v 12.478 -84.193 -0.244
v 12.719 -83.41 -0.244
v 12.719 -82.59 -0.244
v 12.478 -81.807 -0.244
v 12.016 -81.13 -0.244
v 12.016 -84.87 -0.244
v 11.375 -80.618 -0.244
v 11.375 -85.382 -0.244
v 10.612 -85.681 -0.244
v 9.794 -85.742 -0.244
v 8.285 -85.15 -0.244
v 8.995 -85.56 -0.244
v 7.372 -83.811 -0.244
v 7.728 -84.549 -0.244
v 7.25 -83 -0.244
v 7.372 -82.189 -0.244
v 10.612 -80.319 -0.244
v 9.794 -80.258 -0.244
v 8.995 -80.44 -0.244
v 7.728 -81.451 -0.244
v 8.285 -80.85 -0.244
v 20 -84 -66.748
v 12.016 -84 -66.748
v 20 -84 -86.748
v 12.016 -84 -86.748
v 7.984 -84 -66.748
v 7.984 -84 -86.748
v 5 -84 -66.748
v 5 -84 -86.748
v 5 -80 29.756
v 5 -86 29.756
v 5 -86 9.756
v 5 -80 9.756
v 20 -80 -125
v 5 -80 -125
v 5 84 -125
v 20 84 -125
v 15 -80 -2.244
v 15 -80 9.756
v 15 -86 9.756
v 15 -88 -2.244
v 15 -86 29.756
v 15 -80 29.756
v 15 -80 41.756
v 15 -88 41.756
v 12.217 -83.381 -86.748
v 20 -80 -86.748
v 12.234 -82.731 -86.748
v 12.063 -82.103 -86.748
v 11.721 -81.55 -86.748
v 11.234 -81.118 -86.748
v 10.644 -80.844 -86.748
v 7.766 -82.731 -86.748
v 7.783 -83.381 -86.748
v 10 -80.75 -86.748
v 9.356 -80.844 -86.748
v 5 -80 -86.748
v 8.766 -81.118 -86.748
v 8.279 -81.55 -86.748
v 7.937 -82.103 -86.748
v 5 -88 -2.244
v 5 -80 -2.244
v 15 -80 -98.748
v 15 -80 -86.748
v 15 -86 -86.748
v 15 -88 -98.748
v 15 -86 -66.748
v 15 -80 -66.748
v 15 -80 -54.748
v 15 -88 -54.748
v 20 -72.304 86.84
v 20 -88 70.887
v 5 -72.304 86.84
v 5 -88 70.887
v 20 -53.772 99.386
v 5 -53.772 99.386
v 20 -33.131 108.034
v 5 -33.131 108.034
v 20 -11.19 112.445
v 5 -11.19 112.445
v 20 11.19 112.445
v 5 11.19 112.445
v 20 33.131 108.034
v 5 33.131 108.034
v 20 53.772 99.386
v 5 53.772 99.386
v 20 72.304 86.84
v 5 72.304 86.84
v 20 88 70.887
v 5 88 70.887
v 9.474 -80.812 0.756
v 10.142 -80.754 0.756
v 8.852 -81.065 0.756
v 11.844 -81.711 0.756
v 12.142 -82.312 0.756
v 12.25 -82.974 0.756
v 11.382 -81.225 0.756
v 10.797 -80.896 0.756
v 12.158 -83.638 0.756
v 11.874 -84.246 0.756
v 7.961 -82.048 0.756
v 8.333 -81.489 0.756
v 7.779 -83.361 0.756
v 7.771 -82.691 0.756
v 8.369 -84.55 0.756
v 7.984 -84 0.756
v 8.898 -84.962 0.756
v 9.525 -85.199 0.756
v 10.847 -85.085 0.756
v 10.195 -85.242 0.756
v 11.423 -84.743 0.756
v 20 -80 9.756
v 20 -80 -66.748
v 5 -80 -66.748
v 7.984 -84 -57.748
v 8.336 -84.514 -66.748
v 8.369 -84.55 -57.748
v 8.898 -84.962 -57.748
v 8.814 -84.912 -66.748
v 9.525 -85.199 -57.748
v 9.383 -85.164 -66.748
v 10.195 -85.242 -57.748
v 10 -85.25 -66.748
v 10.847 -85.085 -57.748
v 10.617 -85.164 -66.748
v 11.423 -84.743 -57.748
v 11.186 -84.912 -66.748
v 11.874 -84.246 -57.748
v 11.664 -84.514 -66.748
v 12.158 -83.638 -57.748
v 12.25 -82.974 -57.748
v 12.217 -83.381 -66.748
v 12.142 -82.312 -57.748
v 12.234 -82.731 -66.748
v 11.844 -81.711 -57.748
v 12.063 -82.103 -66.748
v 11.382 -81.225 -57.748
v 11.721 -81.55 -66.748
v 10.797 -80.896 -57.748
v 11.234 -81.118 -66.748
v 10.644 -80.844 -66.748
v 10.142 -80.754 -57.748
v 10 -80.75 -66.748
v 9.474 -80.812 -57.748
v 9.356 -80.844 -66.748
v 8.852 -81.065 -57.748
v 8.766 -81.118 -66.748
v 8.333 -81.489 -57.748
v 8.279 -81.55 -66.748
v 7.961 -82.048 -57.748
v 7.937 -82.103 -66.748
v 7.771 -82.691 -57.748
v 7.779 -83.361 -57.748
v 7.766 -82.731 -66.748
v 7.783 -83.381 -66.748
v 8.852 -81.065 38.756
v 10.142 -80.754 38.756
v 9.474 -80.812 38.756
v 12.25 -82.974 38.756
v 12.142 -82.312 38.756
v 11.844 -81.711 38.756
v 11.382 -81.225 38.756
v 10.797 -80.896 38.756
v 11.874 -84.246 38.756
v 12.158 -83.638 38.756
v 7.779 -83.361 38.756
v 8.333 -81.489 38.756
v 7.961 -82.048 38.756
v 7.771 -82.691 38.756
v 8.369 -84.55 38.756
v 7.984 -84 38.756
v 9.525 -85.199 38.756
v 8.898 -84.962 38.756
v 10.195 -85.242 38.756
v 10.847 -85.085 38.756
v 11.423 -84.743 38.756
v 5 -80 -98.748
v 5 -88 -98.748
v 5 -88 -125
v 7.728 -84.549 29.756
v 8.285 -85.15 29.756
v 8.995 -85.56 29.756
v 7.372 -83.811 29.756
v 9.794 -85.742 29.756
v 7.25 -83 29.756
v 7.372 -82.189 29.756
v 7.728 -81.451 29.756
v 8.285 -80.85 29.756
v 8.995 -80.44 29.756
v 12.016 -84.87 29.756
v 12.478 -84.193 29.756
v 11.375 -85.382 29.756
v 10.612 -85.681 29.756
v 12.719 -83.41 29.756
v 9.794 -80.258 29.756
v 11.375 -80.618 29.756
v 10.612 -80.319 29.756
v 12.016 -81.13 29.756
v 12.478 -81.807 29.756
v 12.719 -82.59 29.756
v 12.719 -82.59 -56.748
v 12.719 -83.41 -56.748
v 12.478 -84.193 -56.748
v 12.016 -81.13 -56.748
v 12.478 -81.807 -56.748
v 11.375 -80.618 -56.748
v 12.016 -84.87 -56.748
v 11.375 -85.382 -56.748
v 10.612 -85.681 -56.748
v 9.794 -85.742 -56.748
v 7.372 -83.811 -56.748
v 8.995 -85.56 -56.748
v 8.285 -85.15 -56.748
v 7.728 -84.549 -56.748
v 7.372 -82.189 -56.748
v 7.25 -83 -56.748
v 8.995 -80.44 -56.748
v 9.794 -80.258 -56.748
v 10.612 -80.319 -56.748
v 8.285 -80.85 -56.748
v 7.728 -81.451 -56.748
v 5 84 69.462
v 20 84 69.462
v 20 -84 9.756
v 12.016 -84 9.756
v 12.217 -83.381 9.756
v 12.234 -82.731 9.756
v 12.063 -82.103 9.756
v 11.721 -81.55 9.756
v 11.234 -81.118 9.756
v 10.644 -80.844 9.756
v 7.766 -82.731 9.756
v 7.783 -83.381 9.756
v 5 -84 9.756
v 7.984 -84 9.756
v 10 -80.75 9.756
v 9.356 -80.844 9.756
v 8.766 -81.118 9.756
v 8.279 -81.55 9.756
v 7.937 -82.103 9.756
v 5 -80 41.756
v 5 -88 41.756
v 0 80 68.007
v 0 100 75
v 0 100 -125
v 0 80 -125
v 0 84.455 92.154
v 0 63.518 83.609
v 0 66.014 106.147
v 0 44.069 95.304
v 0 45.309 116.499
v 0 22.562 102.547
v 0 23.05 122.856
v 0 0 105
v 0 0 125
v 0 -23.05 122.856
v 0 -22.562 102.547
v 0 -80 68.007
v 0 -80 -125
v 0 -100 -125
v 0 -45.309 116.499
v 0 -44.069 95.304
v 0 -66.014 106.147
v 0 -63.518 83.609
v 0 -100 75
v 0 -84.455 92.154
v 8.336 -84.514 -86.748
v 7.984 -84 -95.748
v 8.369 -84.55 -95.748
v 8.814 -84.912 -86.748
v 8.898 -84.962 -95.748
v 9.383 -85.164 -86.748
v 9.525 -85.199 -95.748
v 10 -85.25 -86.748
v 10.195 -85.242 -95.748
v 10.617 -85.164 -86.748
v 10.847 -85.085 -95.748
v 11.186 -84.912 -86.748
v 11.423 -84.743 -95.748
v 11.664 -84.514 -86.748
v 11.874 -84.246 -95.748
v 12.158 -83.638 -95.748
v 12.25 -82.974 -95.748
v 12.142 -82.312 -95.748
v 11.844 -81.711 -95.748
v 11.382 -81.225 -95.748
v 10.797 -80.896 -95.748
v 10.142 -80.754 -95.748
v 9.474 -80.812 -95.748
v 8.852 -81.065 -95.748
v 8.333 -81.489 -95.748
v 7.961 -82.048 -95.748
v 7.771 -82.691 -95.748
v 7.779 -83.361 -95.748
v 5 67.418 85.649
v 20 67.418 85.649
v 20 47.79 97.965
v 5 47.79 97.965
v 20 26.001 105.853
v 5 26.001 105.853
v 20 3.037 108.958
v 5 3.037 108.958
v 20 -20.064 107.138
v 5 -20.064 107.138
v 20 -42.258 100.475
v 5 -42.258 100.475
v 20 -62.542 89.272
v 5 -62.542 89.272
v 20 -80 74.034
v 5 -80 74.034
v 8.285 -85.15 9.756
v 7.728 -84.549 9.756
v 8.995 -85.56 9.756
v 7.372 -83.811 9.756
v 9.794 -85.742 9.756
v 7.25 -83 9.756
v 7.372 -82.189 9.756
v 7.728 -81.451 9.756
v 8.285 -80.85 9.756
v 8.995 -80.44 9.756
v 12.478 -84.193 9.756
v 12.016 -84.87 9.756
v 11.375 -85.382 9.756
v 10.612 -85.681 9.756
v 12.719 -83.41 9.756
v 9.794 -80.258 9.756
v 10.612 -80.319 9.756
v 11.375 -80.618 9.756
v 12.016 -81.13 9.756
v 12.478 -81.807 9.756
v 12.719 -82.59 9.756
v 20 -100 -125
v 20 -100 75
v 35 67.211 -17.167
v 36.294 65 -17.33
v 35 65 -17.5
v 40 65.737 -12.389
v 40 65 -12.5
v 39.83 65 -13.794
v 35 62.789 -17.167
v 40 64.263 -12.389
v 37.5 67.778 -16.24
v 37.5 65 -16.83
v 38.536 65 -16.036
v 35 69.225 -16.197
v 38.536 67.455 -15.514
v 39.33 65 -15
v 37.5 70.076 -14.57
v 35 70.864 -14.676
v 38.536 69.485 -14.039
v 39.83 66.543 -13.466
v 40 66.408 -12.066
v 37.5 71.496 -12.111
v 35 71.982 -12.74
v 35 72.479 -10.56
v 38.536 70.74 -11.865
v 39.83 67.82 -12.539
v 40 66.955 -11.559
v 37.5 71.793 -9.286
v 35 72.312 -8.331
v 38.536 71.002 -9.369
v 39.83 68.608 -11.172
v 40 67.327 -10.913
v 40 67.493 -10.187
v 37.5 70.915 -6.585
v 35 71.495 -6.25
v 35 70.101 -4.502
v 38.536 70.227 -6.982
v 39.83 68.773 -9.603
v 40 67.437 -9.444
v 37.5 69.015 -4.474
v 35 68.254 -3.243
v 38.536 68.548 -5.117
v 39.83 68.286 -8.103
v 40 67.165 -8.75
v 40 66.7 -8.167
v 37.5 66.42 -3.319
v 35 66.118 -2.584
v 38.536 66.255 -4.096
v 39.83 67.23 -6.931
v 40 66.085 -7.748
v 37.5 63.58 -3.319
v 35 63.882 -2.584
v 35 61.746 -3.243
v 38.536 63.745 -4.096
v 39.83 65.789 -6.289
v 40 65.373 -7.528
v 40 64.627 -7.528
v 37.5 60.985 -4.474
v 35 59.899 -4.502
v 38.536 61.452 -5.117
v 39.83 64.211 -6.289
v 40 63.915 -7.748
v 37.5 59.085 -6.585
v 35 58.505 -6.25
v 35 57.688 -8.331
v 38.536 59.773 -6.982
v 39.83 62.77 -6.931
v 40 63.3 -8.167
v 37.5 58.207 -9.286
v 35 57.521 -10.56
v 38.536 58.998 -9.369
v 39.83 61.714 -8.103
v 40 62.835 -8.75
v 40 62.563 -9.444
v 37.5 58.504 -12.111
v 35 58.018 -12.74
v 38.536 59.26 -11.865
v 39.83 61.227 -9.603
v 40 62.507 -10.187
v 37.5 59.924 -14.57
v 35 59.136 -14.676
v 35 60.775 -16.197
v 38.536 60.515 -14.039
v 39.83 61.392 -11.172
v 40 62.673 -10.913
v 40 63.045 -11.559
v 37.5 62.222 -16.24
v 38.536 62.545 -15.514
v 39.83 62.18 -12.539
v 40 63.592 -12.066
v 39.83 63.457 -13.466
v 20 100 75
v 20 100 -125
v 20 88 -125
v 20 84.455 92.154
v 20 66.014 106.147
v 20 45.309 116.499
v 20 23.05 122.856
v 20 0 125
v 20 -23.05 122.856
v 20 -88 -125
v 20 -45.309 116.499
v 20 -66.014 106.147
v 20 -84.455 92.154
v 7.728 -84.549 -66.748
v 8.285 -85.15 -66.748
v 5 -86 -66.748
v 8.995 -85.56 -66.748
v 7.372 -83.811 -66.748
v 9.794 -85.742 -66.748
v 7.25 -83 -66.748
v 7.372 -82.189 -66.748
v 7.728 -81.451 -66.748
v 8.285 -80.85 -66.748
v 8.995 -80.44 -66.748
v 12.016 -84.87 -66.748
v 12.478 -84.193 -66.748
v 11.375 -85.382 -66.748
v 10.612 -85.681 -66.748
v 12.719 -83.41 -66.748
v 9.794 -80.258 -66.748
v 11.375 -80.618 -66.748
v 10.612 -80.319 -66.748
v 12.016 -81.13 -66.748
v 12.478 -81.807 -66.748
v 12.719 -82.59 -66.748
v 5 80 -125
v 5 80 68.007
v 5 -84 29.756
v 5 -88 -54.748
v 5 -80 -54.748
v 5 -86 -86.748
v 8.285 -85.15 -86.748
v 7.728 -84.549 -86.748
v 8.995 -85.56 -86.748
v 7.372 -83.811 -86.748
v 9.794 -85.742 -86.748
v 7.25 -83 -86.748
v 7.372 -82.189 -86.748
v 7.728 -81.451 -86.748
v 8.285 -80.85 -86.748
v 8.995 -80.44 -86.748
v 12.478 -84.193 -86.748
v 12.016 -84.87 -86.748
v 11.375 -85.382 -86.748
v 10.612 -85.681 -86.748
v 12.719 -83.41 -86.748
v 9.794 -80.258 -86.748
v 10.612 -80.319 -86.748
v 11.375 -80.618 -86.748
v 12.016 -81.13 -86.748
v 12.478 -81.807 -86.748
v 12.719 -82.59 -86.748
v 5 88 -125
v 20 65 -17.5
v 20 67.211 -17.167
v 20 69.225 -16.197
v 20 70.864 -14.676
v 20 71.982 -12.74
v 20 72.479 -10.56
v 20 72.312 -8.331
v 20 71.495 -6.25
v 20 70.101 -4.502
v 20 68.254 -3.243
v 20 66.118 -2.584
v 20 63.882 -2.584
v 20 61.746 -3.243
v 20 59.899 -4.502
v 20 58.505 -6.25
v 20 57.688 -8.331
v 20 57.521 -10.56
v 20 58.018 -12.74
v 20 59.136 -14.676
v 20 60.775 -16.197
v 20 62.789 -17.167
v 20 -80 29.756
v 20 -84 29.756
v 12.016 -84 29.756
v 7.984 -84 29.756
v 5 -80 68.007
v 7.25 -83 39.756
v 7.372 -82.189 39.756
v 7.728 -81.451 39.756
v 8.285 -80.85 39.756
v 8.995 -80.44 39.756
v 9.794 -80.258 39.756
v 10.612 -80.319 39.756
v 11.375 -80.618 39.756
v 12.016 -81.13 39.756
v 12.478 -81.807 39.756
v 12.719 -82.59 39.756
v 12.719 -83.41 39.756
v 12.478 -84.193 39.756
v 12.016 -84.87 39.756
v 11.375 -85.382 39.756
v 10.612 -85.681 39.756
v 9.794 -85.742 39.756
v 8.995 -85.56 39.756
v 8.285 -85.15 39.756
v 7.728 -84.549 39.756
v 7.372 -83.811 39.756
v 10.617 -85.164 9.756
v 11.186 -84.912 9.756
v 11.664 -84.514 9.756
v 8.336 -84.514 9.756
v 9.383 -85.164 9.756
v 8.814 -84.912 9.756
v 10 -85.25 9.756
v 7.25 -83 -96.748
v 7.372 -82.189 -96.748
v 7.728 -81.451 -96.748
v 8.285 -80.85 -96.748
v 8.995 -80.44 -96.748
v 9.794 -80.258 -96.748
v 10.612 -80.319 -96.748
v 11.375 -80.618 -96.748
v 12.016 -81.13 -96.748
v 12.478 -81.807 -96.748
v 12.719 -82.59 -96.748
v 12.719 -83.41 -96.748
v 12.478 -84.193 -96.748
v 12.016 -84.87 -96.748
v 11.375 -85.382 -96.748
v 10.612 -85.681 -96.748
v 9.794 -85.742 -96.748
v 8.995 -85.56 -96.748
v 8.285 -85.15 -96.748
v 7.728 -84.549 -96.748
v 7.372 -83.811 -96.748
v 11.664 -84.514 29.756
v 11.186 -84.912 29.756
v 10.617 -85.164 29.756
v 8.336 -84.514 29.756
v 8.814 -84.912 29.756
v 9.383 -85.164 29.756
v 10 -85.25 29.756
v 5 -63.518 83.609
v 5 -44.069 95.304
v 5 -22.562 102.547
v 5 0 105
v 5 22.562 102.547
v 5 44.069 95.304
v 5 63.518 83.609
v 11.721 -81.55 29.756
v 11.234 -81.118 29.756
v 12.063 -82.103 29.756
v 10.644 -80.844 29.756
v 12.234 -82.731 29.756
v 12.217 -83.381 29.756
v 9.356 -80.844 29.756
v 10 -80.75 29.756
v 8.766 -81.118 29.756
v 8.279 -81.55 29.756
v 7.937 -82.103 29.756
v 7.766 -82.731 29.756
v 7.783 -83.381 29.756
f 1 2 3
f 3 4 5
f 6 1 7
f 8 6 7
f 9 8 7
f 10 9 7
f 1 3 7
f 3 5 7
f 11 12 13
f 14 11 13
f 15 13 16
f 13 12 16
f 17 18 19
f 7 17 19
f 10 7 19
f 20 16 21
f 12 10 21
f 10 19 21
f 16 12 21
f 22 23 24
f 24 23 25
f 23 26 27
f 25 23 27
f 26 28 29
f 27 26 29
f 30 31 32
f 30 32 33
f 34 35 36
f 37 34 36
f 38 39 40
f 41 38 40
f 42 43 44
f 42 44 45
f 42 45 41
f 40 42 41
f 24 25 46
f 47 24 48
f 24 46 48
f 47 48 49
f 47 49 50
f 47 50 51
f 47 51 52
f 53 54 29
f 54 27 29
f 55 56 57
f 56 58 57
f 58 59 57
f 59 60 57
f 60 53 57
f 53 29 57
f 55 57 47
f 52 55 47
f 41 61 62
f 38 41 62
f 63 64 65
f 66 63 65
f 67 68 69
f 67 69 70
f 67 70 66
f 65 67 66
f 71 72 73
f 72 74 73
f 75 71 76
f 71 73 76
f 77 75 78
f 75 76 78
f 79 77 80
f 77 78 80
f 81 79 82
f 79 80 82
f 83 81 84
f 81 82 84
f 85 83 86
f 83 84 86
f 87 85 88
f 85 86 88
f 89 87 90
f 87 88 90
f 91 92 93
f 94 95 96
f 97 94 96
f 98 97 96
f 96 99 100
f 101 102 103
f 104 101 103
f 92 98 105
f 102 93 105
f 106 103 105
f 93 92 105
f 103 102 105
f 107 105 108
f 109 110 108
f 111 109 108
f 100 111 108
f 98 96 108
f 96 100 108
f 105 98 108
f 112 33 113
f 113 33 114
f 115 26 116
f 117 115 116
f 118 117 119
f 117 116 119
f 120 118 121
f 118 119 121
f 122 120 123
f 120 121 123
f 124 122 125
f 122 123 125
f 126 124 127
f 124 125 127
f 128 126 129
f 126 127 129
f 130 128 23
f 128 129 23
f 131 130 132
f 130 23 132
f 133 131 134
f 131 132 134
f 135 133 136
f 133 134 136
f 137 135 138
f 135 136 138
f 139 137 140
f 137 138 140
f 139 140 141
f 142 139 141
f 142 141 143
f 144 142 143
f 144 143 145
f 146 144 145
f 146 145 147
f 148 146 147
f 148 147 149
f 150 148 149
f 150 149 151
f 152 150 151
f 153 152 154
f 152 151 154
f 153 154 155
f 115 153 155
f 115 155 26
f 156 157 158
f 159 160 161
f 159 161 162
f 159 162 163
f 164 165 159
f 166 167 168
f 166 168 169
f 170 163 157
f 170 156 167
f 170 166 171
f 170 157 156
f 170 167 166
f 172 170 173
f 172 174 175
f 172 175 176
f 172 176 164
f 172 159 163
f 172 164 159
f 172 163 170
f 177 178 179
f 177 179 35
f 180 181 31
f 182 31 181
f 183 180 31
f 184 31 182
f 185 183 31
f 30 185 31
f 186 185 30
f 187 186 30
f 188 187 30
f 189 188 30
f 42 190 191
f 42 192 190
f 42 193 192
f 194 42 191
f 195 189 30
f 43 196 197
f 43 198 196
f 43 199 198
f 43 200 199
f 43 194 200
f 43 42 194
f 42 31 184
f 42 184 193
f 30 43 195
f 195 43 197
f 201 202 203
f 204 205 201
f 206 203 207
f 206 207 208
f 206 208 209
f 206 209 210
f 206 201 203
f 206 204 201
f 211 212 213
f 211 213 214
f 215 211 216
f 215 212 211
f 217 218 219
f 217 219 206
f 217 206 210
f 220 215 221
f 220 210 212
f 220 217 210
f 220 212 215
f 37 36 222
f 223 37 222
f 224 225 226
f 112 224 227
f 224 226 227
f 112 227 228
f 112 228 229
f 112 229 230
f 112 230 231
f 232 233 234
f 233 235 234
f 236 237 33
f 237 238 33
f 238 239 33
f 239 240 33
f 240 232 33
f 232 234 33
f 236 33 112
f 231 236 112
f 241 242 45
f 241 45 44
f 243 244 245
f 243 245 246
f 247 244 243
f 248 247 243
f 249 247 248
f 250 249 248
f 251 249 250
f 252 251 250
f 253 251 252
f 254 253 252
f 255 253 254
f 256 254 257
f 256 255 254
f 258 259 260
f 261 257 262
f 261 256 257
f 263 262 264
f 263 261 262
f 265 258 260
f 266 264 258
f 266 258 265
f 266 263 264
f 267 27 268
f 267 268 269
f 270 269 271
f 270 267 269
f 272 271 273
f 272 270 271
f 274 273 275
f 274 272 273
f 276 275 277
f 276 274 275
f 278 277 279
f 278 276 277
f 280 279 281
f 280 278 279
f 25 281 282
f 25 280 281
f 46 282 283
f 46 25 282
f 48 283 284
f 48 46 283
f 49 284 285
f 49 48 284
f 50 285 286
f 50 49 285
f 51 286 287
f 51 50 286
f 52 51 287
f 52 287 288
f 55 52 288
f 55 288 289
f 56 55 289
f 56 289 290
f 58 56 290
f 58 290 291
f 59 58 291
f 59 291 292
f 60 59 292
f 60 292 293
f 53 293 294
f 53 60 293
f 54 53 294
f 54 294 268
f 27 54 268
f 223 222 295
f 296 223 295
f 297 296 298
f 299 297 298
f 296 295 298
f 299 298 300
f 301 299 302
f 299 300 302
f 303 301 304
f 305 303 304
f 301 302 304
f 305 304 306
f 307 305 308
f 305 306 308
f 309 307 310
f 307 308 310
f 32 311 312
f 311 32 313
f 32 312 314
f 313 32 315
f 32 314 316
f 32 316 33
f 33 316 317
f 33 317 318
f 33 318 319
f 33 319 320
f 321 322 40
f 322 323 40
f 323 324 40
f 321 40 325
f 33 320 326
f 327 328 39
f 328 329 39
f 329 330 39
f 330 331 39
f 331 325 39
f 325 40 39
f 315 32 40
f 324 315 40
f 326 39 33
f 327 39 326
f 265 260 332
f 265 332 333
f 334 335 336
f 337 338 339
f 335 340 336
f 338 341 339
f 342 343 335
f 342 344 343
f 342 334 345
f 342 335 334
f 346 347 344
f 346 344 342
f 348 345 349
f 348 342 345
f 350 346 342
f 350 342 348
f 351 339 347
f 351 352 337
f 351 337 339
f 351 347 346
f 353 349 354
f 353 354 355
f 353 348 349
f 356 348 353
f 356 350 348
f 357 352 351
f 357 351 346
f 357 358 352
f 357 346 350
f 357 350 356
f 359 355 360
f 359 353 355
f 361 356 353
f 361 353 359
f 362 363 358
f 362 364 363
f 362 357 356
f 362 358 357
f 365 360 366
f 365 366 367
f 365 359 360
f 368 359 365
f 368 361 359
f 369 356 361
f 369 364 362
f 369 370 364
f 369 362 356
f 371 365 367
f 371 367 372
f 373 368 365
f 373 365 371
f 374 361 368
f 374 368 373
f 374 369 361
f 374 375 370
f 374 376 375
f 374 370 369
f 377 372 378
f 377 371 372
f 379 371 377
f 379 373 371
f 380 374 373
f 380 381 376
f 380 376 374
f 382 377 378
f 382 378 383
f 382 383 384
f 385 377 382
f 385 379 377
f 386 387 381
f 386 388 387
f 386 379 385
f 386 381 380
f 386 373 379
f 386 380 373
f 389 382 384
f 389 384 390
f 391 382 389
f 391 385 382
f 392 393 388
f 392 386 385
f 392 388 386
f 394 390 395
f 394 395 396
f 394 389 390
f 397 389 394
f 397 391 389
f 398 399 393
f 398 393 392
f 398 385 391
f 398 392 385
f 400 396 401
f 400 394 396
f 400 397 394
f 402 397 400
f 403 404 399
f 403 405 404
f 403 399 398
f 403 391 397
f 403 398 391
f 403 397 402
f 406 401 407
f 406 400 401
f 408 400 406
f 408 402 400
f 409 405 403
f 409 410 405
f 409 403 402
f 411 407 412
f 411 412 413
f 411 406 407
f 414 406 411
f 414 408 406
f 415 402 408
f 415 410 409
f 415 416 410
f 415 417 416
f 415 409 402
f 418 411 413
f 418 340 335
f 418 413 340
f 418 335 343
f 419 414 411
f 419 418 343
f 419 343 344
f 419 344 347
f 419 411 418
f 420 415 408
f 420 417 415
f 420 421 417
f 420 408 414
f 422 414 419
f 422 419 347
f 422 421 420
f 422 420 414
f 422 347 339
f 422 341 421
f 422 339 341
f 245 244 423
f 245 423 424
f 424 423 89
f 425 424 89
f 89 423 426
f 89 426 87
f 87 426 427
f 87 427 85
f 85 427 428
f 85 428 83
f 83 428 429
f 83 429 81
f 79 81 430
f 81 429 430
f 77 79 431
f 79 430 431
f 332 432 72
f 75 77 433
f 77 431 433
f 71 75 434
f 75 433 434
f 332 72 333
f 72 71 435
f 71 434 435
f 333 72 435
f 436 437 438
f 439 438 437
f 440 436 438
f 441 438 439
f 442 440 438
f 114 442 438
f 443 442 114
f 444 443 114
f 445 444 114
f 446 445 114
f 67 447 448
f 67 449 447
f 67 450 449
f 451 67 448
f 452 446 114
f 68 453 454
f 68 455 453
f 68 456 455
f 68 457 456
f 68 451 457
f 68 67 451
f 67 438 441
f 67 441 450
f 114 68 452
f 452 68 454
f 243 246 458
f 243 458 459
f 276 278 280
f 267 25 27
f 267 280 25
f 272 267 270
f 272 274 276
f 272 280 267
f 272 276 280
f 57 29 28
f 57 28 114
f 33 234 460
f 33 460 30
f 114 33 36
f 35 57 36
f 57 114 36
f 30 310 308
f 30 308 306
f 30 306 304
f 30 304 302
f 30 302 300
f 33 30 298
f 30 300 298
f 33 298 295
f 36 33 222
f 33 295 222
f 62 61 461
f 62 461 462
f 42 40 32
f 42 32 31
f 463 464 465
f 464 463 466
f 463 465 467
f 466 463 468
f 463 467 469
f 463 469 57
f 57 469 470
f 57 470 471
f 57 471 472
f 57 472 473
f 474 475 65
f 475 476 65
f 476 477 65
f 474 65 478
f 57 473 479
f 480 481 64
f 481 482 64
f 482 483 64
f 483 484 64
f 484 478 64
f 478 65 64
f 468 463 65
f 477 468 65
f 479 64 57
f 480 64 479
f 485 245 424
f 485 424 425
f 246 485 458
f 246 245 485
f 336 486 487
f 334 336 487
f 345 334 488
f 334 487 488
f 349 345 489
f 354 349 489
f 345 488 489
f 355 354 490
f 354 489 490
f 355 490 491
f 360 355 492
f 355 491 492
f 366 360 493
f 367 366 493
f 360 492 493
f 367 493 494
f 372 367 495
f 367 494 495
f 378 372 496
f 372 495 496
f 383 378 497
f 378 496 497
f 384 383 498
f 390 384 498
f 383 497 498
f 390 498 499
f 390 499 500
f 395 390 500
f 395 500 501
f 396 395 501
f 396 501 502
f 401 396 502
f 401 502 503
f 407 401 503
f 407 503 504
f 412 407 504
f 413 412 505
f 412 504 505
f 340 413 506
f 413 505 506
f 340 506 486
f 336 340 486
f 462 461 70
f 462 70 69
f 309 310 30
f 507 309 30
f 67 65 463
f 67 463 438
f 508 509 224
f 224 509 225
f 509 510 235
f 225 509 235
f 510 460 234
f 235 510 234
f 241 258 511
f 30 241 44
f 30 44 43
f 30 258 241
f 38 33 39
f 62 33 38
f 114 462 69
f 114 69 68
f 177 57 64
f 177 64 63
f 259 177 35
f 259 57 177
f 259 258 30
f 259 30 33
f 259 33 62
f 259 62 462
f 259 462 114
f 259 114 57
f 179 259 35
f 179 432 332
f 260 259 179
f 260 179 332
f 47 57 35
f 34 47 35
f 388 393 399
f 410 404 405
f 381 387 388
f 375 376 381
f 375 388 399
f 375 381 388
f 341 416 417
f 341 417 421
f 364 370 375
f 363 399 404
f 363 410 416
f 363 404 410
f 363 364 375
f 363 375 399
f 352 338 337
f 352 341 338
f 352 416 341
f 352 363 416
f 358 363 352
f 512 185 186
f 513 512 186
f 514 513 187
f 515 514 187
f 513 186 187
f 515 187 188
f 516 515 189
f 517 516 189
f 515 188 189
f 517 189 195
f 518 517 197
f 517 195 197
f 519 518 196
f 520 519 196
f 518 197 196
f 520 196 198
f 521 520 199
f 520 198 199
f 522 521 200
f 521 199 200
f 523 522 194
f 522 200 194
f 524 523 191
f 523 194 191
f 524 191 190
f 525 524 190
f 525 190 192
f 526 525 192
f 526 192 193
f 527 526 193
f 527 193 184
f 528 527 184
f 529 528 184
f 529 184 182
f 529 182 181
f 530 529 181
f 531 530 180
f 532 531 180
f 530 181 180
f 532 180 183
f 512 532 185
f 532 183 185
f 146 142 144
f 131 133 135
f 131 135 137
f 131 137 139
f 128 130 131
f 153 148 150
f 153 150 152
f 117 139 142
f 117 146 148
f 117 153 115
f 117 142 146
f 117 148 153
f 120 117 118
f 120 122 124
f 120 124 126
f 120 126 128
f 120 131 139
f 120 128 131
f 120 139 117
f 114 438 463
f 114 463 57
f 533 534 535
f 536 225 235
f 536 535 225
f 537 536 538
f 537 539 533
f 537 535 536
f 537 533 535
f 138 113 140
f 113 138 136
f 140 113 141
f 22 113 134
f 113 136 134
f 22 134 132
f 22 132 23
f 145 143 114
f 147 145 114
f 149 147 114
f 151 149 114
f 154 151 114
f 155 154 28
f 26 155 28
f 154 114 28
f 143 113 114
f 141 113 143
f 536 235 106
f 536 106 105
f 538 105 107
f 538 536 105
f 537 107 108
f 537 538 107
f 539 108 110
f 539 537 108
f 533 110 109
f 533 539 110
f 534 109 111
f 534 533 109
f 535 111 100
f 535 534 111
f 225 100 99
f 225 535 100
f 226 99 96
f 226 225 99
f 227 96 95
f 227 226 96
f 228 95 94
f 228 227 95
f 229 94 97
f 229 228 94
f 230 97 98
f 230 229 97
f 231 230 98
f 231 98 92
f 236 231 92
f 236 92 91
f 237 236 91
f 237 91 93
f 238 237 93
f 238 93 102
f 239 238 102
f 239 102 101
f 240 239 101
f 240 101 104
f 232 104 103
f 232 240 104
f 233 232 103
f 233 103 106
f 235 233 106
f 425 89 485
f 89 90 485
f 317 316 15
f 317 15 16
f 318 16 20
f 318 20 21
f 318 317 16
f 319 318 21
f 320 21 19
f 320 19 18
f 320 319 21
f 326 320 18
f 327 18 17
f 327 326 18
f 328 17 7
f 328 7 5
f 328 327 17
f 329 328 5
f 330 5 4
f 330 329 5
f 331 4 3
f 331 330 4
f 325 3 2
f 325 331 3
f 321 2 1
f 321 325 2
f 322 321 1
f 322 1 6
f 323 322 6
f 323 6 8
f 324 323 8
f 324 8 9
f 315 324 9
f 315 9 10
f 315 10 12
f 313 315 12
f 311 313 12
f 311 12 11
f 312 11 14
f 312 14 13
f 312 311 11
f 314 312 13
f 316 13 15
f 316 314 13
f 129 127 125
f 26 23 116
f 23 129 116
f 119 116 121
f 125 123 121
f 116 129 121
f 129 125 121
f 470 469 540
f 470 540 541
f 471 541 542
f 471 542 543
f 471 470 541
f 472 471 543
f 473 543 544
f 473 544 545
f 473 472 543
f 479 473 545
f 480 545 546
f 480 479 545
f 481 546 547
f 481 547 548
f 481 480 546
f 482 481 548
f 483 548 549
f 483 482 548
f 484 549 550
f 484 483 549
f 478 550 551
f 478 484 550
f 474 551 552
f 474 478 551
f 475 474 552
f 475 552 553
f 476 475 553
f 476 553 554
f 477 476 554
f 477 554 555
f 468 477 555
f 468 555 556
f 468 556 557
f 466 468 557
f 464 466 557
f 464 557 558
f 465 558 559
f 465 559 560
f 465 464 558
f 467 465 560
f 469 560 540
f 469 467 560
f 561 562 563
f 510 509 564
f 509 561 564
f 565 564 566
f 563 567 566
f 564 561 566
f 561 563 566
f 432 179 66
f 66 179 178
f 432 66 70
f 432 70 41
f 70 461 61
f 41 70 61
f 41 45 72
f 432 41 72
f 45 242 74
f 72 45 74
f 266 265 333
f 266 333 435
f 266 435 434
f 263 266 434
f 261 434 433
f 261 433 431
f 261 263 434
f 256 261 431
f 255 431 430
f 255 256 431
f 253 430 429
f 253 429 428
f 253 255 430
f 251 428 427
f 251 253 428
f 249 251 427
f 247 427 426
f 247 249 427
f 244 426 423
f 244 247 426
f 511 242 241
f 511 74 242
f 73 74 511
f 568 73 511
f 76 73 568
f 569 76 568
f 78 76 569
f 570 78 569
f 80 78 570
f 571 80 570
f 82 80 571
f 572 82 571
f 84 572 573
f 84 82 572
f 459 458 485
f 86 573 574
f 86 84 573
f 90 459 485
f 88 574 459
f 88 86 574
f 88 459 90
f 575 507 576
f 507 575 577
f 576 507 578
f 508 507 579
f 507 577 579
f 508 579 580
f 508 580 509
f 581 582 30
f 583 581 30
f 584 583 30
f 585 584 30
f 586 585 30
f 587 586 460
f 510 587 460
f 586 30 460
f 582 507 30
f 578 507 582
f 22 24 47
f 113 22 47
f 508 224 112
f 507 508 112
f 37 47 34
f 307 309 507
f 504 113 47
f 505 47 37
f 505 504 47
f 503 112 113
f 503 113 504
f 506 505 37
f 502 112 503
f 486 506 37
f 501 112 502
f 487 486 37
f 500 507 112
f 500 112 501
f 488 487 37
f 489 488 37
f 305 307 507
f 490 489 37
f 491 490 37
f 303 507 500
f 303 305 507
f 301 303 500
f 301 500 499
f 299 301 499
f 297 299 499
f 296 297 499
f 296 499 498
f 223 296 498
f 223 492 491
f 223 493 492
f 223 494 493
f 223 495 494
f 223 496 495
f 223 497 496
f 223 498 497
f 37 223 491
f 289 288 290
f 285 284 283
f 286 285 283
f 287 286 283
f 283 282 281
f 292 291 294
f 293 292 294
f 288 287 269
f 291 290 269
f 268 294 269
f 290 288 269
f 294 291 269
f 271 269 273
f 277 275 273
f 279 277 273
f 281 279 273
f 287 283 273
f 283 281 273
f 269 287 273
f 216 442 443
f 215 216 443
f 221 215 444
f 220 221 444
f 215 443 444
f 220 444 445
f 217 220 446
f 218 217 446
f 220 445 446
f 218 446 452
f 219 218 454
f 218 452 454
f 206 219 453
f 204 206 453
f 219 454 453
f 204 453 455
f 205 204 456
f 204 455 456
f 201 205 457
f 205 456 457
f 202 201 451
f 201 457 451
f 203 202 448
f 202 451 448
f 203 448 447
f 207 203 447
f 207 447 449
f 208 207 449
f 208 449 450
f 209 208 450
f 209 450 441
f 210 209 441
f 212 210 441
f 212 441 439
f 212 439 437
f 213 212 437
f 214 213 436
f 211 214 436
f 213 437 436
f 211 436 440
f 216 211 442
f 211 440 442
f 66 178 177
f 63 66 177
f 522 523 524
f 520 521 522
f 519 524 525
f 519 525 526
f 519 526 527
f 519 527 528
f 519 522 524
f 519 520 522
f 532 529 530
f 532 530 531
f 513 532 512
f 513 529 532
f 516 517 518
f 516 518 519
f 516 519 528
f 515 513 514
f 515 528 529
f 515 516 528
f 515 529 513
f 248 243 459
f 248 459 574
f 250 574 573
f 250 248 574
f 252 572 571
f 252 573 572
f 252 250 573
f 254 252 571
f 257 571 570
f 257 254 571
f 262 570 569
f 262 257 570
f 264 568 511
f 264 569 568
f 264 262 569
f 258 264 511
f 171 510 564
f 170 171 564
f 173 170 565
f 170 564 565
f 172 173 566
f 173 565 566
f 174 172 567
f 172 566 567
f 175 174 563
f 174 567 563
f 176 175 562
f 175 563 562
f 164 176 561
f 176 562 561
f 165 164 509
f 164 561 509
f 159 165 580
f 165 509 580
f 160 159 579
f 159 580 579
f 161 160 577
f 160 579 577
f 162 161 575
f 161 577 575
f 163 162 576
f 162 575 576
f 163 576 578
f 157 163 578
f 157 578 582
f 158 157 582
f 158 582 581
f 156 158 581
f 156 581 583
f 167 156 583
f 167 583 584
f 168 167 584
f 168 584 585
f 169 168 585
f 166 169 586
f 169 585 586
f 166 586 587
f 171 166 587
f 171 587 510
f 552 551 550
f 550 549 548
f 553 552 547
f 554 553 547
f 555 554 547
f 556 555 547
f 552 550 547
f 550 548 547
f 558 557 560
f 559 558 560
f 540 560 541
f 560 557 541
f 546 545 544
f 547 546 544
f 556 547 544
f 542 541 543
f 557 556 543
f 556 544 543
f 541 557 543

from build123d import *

# Parameters (mm, degrees)
SALIENTE_EXTRUIR1_DEPTH      = 20
CORTAR_EXTRUIR1_START        = -5
CORTAR_EXTRUIR1_DEPTH        = 5
CROQUIS3_W                   = 6
CROQUIS3_H                   = 20
CORTAR_EXTRUIR2_DEPTH        = 10
CROQUIS4_R                   = 2.75
CORTAR_EXTRUIR3_DEPTH        = 10
SIMETR_A2_COPY_1_SKETCH_R    = 2.75
SIMETR_A2_COPY_1_DEPTH       = 10
SALIENTE_EXTRUIR2_DEPTH      = 5
SALIENTE_EXTRUIR2_DEPTH_BACK = 10
CROQUIS6_R                   = 2.25
SALIENTE_EXTRUIR3_DEPTH      = 9
SIMETR_A4_COPY_1_SKETCH_R    = 2.25
SIMETR_A4_COPY_1_DEPTH       = 9
CORTAR_EXTRUIR4_START        = -10
CROQUIS7_W                   = 8
CROQUIS7_H                   = 26.251838136
CROQUIS7_H_2                 = 52.503676272
CORTAR_EXTRUIR4_DEPTH        = 10
CROQUIS8_R                   = 7.5
SALIENTE_EXTRUIR5_DEPTH      = 20
REDONDEO1_R                  = 5


with BuildPart() as part:
    # Croquis1 → Saliente-Extruir1 (new body)
    with BuildSketch(Plane.YZ):
        with BuildLine():
            Line((-100, -125), (-100, 75))
            ThreePointArc((-100, 75), (0, 125), (100, 75))
            Line((100, 75), (100, -125))
            Line((100, -125), (80, -125))
            Line((80, -125), (80, -105))
            Line((80, -105), (80, 68.007352544))
            ThreePointArc((80, 68.007352544), (0, 105), (-80, 68.007352544))
            Line((-80, 68.007352544), (-80, -105))
            Line((-80, -105), (-80, -125))
            Line((-80, -125), (-100, -125))
        make_face()
    extrude(amount=SALIENTE_EXTRUIR1_DEPTH)

    # Croquis2 → Cortar-Extruir1 (cut)
    with BuildSketch(Plane.YZ.offset(20).offset(CORTAR_EXTRUIR1_START)):
        with BuildLine():
            Line((88, 70.887234394), (88, -125))
            Line((88, -125), (80, -125))
            Line((80, -125), (80, 68.007352544))
            ThreePointArc((80, 68.007352544), (0, 105), (-80, 68.007352544))
            Line((-80, 68.007352544), (-80, -125))
            Line((-80, -125), (-88, -125))
            Line((-88, -125), (-88, 70.887234394))
            ThreePointArc((-88, 70.887234394), (0, 113), (88, 70.887234394))
        make_face()
    extrude(amount=CORTAR_EXTRUIR1_DEPTH, mode=Mode.SUBTRACT)

    # Croquis3 → Cortar-Extruir2 (cut)
    with BuildSketch(Plane.YZ.offset(15)):
        with Locations((-83, -76.748161864)):
            Rectangle(CROQUIS3_W, CROQUIS3_H)
        with Locations((-83, 19.755514408)):
            Rectangle(CROQUIS3_W, CROQUIS3_H)
    extrude(amount=-CORTAR_EXTRUIR2_DEPTH, mode=Mode.SUBTRACT)

    # Croquis4 → Cortar-Extruir3 (cut)
    with BuildSketch(Plane(origin=(0, 0, 29.755514408), x_dir=(1, 0, 0), z_dir=(0, 0, -1))):
        with Locations(Location((10, 83, 0), (0, 0, 180))):
            Circle(CROQUIS4_R)
    cortar_extruir3 = extrude(amount=-CORTAR_EXTRUIR3_DEPTH, mode=Mode.SUBTRACT)

    # Simetría1: Cortar-Extruir3 across plane
    add(cortar_extruir3.mirror(Plane(origin=(0, 0, 19.755514408), x_dir=(1, 0, 0), z_dir=(0, 0, -1))), mode=Mode.SUBTRACT)

    # Simetría2: Cortar-Extruir3 across plane
    add(cortar_extruir3.mirror(Plane(origin=(0, 0, -28.496323728), x_dir=(1, 0, 0), z_dir=(0, 0, -1))), mode=Mode.SUBTRACT)

    # Simetría2 copy 1 sketch → Simetría2 copy 1 (cut)
    with BuildSketch(Plane(origin=(0, 0, -66.748161864), x_dir=(1, 0, 0), z_dir=(0, 0, -1))):
        with Locations(Location((10, 83, 0), (0, 0, 180))):
            Circle(SIMETR_A2_COPY_1_SKETCH_R)
    extrude(amount=-SIMETR_A2_COPY_1_DEPTH, mode=Mode.SUBTRACT)

    # Croquis7 → Cortar-Extruir4 (cut)
    with BuildSketch(Plane.YZ.offset(15).offset(CORTAR_EXTRUIR4_START)):
        with Locations((-84, -111.874080932)):
            Rectangle(CROQUIS7_W, CROQUIS7_H)
        with Locations((-84, -28.496323728)):
            Rectangle(CROQUIS7_W, CROQUIS7_H_2)
        with BuildLine():
            Line((-88, 41.755514408), (-80, 41.755514408))
            Line((-80, 41.755514408), (-80, 68.007352544))
            ThreePointArc((-80, 68.007352544), (0, 105), (80, 68.007352544))
            Line((80, 68.007352544), (80, -125))
            Line((80, -125), (88, -125))
            Line((88, -125), (88, 70.887234394))
            ThreePointArc((88, 70.887234394), (0, 113), (-88, 70.887234394))
            Line((-88, 70.887234394), (-88, 41.755514408))
        make_face()
    extrude(amount=CORTAR_EXTRUIR4_DEPTH, mode=Mode.SUBTRACT)


with BuildPart() as body_2:
    # Croquis5 → Saliente-Extruir2 (new, two sides: drawn at the far end of the back side and taken through both)
    with BuildSketch(Plane.YZ.offset(15).offset(-SALIENTE_EXTRUIR2_DEPTH_BACK)):
        with BuildLine():
            Line((-80, -125), (84, -125))
            Line((84, -125), (84, 69.462219947))
            ThreePointArc((84, 69.462219947), (3.037232516, 108.957676272), (-80, 74.033776076))
            Line((-80, 74.033776076), (-80, 29.755514408))
            Line((-80, 29.755514408), (-84, 29.755514408))
            Line((-84, 29.755514408), (-84, 9.755514408))
            Line((-84, 9.755514408), (-80, 9.755514408))
            Line((-80, 9.755514408), (-80, -66.748161864))
            Line((-80, -66.748161864), (-84, -66.748161864))
            Line((-84, -66.748161864), (-84, -86.748161864))
            Line((-84, -86.748161864), (-80, -86.748161864))
            Line((-80, -86.748161864), (-80, -125))
        make_face()
    extrude(amount=SALIENTE_EXTRUIR2_DEPTH + SALIENTE_EXTRUIR2_DEPTH_BACK)

    # Croquis6 → Saliente-Extruir3 (add)
    with BuildSketch(Plane.XY.offset(29.755514408)):
        with Locations(Location((10, -83, 0), (0, 0, 206.387799961))):
            Circle(CROQUIS6_R)
    saliente_extruir3 = extrude(amount=SALIENTE_EXTRUIR3_DEPTH)

    # Simetría3: Saliente-Extruir3 across plane
    add(saliente_extruir3.mirror(Plane(origin=(0, 0, 19.755514408), x_dir=(1, 0, 0), z_dir=(0, 0, -1))))

    # Simetría4: Saliente-Extruir3 across plane
    add(saliente_extruir3.mirror(Plane(origin=(0, 0, -28.496323728), x_dir=(1, 0, 0), z_dir=(0, 0, -1))))

    # Simetría4 copy 1 sketch → Simetría4 copy 1 (add)
    with BuildSketch(Plane.XY.offset(-66.748161864)):
        with Locations(Location((10, -83, 0), (0, 0, 206.387799961))):
            Circle(SIMETR_A4_COPY_1_SKETCH_R)
    extrude(amount=SIMETR_A4_COPY_1_DEPTH)

    # Croquis8 → Saliente-Extruir5 (add)
    with BuildSketch(Plane.YZ.offset(20)):
        with Locations(Location((65, -10, 0), (0, 0, 270))):
            Circle(CROQUIS8_R)
    extrude(amount=SALIENTE_EXTRUIR5_DEPTH)

    # Redondeo1
    redondeo1_edges = [body_2.edges().sort_by_distance(p)[0] for p in [
        (40, 65, -2.5),
    ]]
    fillet(redondeo1_edges, radius=REDONDEO1_R)


solid = Compound([part.part, body_2.part])
